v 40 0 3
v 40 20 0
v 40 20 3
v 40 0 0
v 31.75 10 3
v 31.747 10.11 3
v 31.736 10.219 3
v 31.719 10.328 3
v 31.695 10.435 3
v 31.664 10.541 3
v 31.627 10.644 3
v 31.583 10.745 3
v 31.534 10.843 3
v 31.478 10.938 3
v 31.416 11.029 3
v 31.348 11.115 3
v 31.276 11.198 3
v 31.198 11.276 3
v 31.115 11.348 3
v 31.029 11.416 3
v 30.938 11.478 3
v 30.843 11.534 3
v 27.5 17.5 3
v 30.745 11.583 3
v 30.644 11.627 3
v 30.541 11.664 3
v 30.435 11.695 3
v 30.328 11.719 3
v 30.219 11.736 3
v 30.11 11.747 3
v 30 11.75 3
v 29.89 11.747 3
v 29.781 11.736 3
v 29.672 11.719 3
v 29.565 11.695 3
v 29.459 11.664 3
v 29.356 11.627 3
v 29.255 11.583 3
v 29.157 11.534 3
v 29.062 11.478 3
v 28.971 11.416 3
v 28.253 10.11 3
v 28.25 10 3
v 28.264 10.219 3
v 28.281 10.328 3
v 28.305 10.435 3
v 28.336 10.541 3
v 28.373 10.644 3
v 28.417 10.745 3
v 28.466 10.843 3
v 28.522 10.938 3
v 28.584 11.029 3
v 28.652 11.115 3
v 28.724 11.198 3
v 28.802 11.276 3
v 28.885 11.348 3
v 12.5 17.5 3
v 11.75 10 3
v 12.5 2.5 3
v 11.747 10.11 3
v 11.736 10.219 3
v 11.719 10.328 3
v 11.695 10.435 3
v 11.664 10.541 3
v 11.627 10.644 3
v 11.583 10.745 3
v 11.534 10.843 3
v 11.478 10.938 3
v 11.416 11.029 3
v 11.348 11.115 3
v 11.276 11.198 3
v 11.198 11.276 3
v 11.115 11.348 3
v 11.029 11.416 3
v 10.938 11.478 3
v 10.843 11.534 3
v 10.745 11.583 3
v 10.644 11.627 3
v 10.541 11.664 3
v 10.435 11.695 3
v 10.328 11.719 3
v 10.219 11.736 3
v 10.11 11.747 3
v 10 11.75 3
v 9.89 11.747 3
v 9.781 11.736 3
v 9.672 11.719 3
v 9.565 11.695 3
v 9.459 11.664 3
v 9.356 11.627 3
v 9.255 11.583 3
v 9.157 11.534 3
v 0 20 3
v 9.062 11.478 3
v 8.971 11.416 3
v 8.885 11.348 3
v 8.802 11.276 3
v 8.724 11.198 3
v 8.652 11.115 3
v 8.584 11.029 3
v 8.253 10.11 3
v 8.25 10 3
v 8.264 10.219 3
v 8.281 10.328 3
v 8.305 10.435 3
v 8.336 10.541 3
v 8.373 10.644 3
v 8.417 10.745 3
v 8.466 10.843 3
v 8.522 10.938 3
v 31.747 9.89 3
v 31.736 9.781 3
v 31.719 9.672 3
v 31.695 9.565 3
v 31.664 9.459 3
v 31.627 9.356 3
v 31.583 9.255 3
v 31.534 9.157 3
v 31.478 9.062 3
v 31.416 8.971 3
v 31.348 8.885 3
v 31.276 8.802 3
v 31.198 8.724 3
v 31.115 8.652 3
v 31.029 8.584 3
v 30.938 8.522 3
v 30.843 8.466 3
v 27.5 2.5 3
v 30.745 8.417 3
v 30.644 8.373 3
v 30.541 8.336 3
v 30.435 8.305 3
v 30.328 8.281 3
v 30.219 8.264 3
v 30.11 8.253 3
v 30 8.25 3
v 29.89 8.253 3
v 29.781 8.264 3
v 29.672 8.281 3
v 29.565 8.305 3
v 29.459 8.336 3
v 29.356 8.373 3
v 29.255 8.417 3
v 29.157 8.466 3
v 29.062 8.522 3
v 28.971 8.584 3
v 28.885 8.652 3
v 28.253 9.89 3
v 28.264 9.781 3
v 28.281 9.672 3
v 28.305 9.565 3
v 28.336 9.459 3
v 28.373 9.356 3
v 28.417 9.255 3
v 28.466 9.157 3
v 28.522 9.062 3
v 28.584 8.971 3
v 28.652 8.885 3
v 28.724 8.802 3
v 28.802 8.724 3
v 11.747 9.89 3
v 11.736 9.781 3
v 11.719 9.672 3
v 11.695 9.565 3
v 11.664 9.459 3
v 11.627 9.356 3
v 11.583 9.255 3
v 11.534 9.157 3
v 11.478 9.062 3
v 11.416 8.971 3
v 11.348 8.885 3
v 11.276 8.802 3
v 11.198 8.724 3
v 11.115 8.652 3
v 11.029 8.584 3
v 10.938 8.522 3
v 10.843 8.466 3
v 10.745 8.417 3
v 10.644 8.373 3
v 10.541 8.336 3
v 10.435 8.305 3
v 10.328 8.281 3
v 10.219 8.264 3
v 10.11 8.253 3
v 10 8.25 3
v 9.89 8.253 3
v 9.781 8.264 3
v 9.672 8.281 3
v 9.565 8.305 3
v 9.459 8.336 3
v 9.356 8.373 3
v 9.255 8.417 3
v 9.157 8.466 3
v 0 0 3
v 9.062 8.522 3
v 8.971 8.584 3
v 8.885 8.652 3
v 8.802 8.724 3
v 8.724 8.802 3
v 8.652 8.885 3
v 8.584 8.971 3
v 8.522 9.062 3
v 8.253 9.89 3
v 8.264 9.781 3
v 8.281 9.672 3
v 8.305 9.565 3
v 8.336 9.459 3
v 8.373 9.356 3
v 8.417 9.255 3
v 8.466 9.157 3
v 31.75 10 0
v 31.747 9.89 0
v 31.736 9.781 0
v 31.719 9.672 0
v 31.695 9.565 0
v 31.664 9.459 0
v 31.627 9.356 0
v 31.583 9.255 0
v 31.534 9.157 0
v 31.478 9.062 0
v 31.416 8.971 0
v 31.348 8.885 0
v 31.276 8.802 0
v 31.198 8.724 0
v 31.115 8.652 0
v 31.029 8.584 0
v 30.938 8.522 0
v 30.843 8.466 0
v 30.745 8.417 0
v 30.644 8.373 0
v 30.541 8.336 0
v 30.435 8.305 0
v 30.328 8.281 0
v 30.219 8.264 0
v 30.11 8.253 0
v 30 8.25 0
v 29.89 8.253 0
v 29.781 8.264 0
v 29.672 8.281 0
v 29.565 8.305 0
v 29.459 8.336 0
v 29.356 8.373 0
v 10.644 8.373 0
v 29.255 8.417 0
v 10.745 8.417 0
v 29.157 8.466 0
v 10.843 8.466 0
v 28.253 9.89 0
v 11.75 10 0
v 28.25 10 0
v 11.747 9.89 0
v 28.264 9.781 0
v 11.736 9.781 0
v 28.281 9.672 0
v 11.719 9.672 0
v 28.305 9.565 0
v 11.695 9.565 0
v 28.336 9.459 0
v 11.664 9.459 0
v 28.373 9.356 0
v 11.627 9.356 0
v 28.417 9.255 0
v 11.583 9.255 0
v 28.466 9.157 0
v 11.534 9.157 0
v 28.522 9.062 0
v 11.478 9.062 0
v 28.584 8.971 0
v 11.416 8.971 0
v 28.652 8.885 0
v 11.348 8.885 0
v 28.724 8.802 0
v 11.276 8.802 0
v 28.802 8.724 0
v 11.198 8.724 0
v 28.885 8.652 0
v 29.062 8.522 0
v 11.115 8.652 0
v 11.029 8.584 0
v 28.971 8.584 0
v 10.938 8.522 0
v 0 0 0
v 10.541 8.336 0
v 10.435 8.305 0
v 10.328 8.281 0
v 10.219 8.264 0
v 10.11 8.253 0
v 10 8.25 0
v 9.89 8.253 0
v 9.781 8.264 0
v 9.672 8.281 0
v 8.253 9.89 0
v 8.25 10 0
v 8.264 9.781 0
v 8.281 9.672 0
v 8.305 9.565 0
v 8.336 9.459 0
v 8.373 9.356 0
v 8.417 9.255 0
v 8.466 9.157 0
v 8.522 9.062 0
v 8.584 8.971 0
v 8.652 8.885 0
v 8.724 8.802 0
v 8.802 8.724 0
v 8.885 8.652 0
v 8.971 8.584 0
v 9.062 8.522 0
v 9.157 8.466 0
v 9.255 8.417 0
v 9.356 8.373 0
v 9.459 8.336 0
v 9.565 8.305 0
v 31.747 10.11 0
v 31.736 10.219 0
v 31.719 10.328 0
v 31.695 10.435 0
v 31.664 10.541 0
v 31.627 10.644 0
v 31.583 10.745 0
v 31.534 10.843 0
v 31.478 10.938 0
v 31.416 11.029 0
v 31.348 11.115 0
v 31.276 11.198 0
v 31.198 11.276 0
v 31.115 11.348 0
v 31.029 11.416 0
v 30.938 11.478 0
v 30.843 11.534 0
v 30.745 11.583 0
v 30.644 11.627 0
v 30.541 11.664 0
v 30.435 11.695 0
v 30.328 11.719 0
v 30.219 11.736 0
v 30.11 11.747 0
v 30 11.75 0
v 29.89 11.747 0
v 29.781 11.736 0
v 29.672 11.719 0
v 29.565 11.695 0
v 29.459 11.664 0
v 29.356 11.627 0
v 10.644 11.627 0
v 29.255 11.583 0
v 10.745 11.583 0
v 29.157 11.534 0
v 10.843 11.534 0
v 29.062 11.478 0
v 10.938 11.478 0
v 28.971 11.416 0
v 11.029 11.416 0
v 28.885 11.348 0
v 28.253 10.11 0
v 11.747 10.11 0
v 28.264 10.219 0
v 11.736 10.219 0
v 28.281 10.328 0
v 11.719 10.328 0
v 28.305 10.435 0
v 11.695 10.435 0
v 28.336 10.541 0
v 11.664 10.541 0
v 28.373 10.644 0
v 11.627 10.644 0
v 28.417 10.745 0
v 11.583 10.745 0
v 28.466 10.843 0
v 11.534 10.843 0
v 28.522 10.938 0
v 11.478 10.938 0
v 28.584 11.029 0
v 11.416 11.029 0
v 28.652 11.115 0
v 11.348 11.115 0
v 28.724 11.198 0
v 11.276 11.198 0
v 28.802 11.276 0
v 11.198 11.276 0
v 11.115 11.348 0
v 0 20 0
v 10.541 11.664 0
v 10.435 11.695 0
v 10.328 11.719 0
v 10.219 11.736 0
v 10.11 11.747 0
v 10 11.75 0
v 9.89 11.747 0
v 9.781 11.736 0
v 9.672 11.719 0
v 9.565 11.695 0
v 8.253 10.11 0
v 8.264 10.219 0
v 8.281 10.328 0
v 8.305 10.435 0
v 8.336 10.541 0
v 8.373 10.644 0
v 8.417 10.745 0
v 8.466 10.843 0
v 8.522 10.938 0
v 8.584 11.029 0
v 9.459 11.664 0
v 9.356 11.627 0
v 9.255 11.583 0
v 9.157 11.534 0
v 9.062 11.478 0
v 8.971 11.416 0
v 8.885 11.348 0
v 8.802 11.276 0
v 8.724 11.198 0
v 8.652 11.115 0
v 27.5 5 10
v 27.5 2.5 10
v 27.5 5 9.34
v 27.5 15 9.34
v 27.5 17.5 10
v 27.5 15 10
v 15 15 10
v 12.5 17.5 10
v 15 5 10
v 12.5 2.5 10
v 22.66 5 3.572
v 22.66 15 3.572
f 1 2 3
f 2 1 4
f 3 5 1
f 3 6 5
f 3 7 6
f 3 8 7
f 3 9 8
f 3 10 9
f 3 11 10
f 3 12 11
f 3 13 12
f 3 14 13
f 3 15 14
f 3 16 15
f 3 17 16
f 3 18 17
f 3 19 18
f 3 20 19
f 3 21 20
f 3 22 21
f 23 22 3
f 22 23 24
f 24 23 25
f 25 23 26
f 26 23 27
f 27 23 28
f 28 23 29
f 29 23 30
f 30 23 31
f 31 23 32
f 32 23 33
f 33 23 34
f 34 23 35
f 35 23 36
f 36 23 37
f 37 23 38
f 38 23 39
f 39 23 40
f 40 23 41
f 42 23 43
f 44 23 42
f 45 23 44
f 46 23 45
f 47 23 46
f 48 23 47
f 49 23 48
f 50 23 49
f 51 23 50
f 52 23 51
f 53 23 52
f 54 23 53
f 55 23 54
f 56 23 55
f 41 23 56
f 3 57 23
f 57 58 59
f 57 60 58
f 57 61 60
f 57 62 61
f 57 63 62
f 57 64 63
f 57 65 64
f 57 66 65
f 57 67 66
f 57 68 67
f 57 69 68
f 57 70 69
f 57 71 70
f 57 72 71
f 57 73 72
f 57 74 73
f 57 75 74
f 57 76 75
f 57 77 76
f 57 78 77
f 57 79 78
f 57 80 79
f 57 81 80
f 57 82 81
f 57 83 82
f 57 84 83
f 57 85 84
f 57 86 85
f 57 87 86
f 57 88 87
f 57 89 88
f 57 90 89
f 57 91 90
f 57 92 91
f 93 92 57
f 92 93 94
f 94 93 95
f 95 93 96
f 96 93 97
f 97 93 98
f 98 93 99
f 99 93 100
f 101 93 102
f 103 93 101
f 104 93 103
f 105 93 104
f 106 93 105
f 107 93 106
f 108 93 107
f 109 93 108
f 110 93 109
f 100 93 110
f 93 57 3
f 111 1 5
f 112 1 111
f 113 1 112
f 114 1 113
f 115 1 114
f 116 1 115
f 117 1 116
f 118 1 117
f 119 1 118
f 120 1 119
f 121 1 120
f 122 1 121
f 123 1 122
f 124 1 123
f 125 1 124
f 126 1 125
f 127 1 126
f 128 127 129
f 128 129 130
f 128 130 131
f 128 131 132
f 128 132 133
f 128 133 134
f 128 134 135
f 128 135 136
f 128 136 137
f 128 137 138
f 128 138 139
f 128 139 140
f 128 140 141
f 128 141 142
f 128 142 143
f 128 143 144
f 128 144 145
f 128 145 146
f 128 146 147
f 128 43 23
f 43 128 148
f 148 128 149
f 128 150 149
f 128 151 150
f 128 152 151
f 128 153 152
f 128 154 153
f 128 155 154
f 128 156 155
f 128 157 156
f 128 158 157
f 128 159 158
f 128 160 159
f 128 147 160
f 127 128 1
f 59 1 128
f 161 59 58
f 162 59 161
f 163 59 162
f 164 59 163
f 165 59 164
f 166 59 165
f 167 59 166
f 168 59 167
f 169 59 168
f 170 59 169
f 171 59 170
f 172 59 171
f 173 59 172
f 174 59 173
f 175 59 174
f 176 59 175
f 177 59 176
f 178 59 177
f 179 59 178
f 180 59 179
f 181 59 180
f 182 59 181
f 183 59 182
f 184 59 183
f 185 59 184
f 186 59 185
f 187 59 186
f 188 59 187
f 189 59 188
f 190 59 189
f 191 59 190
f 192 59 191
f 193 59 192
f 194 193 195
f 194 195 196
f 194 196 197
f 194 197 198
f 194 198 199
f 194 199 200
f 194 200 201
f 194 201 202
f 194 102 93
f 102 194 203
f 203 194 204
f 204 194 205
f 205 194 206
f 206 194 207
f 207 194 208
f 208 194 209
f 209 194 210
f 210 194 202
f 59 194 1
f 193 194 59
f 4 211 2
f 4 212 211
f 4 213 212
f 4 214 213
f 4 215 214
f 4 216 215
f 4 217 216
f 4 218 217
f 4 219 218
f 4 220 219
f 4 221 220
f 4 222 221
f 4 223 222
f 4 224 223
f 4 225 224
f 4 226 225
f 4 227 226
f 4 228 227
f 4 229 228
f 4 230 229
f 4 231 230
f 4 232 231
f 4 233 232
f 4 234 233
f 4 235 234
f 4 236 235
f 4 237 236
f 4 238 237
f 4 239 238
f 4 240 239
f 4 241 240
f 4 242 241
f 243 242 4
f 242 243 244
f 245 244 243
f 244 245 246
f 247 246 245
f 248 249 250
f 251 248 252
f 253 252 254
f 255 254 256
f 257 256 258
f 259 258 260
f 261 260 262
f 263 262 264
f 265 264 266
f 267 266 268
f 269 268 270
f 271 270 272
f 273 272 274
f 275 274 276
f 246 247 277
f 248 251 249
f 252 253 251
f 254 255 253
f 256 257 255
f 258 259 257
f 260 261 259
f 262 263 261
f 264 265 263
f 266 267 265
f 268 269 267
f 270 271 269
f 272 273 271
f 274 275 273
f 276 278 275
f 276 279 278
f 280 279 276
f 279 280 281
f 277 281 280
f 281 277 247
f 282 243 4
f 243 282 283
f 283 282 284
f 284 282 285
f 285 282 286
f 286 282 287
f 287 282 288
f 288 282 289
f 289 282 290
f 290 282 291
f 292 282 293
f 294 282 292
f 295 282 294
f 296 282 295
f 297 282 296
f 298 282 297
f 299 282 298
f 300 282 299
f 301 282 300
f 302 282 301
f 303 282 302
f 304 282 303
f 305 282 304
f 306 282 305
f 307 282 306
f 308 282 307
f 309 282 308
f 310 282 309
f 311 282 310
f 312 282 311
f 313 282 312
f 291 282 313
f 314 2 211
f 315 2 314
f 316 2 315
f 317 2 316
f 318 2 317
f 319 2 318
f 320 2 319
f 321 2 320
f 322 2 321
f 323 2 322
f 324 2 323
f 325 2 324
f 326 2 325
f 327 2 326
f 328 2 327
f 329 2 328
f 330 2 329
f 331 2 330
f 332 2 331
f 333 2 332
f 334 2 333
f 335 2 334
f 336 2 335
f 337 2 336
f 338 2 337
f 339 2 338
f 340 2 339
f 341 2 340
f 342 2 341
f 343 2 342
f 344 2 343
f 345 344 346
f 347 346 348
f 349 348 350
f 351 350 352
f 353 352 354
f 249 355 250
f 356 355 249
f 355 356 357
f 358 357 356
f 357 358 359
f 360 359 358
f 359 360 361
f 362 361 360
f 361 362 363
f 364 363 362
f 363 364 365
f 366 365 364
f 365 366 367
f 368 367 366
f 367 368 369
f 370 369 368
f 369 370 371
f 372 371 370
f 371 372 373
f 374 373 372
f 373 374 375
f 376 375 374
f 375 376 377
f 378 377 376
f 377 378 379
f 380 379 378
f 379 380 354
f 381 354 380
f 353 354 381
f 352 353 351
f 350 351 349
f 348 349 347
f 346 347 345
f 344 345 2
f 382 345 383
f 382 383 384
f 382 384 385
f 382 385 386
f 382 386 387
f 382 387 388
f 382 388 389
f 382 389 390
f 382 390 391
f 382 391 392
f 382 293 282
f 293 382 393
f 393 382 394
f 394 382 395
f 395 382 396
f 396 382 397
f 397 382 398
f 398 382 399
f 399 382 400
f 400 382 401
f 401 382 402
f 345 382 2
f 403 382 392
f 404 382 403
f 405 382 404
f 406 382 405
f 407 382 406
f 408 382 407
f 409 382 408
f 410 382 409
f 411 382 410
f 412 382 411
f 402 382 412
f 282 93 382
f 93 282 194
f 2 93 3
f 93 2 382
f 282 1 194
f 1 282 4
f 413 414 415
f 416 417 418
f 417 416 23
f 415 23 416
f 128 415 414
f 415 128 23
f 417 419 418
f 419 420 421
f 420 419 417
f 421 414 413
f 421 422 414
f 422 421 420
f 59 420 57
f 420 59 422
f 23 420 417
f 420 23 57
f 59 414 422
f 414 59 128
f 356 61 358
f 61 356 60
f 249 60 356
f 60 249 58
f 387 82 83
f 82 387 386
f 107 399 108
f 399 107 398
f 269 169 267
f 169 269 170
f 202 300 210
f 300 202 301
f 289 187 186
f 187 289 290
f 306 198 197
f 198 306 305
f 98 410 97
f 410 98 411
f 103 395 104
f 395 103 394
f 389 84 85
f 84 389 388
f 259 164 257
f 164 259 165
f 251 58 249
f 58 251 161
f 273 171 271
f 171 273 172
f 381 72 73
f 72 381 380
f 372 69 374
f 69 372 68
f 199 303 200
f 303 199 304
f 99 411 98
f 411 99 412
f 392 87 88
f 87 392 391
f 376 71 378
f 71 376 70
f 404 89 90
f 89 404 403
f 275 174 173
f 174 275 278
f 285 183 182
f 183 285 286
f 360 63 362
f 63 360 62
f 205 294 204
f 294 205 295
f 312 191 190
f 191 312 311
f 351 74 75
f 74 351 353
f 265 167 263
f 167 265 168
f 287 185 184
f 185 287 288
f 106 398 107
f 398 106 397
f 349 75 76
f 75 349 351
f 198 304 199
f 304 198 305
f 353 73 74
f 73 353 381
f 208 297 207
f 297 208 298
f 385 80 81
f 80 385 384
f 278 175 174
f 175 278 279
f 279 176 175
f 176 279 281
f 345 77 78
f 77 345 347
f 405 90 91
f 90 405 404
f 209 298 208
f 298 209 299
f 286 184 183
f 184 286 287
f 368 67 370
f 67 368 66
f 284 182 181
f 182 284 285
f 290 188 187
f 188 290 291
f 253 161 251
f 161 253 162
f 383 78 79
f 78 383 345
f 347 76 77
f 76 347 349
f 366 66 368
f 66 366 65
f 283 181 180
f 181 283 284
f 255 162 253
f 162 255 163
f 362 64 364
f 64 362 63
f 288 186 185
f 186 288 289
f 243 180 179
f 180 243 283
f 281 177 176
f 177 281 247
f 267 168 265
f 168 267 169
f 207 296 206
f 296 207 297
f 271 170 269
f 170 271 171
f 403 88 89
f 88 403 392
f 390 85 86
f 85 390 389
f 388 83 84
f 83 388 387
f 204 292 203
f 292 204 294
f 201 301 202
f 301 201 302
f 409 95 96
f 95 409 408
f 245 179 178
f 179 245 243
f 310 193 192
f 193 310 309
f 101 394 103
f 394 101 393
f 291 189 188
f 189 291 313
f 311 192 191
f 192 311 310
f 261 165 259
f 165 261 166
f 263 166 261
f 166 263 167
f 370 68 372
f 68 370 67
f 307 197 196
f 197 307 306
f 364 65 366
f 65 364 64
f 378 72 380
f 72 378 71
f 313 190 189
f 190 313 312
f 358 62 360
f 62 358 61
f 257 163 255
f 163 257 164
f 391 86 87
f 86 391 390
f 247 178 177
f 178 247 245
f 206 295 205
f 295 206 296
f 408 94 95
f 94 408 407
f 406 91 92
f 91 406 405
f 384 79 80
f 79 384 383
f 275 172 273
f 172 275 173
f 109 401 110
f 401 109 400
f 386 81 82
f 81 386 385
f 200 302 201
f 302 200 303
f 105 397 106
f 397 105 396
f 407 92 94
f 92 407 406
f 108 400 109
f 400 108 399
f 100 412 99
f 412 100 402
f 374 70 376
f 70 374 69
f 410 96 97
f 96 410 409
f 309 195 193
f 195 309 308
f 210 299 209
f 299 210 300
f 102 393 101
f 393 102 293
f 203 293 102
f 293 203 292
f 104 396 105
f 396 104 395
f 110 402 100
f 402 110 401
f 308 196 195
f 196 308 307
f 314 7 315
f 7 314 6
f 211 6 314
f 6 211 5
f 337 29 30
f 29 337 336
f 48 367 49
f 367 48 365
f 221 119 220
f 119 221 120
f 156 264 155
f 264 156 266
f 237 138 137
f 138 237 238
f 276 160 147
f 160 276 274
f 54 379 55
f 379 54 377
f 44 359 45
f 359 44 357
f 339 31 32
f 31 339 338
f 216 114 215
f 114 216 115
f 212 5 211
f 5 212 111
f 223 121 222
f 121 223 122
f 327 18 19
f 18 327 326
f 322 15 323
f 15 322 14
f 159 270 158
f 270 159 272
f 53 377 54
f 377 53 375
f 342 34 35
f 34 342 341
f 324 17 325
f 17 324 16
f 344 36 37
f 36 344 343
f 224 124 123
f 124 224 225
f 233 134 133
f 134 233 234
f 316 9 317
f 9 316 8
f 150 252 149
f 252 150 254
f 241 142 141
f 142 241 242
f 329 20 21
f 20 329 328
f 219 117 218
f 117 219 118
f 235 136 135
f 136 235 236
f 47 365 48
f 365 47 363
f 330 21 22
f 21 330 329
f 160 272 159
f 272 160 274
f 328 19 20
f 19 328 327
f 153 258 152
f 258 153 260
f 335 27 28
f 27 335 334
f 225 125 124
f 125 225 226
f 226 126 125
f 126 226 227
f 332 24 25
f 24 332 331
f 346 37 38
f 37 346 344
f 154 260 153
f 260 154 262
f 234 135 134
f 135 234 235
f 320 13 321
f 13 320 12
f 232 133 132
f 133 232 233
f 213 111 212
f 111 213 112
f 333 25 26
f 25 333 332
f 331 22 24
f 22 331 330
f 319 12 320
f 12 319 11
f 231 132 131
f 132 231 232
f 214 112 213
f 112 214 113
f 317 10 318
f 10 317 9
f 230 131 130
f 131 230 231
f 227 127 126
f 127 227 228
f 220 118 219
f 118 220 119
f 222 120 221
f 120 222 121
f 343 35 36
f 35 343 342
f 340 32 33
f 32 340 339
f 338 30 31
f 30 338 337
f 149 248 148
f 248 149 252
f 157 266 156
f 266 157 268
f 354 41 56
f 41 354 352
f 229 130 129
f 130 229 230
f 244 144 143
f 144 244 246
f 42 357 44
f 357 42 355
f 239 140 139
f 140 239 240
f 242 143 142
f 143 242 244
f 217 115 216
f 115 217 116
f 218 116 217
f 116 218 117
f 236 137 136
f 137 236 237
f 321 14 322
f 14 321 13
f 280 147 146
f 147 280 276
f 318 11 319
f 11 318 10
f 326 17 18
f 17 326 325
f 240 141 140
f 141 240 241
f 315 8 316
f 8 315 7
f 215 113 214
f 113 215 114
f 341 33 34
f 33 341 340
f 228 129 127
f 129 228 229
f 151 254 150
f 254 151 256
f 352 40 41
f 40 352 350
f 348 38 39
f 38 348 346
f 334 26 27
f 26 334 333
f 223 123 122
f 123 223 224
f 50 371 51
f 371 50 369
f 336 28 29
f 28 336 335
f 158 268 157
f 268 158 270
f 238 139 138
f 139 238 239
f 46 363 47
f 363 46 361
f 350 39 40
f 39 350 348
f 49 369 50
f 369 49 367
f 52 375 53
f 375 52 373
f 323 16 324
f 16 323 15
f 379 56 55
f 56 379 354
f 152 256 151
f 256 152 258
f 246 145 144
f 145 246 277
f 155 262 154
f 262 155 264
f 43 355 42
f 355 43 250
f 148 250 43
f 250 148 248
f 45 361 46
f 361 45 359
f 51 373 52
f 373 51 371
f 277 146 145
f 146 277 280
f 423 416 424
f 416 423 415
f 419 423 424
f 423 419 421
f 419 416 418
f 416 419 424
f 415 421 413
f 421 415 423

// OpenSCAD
$fn=100;

bodyWidth = 20;
thickness = 7;

difference()
{
	union(){
		cube([40,bodyWidth,3]);
		translate([12.5,2.5,0]) cube([15,15,10]);
	}
	translate([10,bodyWidth/2,-1]) cylinder(h=thickness+2,r=1.75);
	translate([10+20,bodyWidth/2,-1]) cylinder(h=thickness+2,r=1.75);
	translate([15,5,10]) rotate(a=[0,40,0]) cube([10,10,50]);
}

